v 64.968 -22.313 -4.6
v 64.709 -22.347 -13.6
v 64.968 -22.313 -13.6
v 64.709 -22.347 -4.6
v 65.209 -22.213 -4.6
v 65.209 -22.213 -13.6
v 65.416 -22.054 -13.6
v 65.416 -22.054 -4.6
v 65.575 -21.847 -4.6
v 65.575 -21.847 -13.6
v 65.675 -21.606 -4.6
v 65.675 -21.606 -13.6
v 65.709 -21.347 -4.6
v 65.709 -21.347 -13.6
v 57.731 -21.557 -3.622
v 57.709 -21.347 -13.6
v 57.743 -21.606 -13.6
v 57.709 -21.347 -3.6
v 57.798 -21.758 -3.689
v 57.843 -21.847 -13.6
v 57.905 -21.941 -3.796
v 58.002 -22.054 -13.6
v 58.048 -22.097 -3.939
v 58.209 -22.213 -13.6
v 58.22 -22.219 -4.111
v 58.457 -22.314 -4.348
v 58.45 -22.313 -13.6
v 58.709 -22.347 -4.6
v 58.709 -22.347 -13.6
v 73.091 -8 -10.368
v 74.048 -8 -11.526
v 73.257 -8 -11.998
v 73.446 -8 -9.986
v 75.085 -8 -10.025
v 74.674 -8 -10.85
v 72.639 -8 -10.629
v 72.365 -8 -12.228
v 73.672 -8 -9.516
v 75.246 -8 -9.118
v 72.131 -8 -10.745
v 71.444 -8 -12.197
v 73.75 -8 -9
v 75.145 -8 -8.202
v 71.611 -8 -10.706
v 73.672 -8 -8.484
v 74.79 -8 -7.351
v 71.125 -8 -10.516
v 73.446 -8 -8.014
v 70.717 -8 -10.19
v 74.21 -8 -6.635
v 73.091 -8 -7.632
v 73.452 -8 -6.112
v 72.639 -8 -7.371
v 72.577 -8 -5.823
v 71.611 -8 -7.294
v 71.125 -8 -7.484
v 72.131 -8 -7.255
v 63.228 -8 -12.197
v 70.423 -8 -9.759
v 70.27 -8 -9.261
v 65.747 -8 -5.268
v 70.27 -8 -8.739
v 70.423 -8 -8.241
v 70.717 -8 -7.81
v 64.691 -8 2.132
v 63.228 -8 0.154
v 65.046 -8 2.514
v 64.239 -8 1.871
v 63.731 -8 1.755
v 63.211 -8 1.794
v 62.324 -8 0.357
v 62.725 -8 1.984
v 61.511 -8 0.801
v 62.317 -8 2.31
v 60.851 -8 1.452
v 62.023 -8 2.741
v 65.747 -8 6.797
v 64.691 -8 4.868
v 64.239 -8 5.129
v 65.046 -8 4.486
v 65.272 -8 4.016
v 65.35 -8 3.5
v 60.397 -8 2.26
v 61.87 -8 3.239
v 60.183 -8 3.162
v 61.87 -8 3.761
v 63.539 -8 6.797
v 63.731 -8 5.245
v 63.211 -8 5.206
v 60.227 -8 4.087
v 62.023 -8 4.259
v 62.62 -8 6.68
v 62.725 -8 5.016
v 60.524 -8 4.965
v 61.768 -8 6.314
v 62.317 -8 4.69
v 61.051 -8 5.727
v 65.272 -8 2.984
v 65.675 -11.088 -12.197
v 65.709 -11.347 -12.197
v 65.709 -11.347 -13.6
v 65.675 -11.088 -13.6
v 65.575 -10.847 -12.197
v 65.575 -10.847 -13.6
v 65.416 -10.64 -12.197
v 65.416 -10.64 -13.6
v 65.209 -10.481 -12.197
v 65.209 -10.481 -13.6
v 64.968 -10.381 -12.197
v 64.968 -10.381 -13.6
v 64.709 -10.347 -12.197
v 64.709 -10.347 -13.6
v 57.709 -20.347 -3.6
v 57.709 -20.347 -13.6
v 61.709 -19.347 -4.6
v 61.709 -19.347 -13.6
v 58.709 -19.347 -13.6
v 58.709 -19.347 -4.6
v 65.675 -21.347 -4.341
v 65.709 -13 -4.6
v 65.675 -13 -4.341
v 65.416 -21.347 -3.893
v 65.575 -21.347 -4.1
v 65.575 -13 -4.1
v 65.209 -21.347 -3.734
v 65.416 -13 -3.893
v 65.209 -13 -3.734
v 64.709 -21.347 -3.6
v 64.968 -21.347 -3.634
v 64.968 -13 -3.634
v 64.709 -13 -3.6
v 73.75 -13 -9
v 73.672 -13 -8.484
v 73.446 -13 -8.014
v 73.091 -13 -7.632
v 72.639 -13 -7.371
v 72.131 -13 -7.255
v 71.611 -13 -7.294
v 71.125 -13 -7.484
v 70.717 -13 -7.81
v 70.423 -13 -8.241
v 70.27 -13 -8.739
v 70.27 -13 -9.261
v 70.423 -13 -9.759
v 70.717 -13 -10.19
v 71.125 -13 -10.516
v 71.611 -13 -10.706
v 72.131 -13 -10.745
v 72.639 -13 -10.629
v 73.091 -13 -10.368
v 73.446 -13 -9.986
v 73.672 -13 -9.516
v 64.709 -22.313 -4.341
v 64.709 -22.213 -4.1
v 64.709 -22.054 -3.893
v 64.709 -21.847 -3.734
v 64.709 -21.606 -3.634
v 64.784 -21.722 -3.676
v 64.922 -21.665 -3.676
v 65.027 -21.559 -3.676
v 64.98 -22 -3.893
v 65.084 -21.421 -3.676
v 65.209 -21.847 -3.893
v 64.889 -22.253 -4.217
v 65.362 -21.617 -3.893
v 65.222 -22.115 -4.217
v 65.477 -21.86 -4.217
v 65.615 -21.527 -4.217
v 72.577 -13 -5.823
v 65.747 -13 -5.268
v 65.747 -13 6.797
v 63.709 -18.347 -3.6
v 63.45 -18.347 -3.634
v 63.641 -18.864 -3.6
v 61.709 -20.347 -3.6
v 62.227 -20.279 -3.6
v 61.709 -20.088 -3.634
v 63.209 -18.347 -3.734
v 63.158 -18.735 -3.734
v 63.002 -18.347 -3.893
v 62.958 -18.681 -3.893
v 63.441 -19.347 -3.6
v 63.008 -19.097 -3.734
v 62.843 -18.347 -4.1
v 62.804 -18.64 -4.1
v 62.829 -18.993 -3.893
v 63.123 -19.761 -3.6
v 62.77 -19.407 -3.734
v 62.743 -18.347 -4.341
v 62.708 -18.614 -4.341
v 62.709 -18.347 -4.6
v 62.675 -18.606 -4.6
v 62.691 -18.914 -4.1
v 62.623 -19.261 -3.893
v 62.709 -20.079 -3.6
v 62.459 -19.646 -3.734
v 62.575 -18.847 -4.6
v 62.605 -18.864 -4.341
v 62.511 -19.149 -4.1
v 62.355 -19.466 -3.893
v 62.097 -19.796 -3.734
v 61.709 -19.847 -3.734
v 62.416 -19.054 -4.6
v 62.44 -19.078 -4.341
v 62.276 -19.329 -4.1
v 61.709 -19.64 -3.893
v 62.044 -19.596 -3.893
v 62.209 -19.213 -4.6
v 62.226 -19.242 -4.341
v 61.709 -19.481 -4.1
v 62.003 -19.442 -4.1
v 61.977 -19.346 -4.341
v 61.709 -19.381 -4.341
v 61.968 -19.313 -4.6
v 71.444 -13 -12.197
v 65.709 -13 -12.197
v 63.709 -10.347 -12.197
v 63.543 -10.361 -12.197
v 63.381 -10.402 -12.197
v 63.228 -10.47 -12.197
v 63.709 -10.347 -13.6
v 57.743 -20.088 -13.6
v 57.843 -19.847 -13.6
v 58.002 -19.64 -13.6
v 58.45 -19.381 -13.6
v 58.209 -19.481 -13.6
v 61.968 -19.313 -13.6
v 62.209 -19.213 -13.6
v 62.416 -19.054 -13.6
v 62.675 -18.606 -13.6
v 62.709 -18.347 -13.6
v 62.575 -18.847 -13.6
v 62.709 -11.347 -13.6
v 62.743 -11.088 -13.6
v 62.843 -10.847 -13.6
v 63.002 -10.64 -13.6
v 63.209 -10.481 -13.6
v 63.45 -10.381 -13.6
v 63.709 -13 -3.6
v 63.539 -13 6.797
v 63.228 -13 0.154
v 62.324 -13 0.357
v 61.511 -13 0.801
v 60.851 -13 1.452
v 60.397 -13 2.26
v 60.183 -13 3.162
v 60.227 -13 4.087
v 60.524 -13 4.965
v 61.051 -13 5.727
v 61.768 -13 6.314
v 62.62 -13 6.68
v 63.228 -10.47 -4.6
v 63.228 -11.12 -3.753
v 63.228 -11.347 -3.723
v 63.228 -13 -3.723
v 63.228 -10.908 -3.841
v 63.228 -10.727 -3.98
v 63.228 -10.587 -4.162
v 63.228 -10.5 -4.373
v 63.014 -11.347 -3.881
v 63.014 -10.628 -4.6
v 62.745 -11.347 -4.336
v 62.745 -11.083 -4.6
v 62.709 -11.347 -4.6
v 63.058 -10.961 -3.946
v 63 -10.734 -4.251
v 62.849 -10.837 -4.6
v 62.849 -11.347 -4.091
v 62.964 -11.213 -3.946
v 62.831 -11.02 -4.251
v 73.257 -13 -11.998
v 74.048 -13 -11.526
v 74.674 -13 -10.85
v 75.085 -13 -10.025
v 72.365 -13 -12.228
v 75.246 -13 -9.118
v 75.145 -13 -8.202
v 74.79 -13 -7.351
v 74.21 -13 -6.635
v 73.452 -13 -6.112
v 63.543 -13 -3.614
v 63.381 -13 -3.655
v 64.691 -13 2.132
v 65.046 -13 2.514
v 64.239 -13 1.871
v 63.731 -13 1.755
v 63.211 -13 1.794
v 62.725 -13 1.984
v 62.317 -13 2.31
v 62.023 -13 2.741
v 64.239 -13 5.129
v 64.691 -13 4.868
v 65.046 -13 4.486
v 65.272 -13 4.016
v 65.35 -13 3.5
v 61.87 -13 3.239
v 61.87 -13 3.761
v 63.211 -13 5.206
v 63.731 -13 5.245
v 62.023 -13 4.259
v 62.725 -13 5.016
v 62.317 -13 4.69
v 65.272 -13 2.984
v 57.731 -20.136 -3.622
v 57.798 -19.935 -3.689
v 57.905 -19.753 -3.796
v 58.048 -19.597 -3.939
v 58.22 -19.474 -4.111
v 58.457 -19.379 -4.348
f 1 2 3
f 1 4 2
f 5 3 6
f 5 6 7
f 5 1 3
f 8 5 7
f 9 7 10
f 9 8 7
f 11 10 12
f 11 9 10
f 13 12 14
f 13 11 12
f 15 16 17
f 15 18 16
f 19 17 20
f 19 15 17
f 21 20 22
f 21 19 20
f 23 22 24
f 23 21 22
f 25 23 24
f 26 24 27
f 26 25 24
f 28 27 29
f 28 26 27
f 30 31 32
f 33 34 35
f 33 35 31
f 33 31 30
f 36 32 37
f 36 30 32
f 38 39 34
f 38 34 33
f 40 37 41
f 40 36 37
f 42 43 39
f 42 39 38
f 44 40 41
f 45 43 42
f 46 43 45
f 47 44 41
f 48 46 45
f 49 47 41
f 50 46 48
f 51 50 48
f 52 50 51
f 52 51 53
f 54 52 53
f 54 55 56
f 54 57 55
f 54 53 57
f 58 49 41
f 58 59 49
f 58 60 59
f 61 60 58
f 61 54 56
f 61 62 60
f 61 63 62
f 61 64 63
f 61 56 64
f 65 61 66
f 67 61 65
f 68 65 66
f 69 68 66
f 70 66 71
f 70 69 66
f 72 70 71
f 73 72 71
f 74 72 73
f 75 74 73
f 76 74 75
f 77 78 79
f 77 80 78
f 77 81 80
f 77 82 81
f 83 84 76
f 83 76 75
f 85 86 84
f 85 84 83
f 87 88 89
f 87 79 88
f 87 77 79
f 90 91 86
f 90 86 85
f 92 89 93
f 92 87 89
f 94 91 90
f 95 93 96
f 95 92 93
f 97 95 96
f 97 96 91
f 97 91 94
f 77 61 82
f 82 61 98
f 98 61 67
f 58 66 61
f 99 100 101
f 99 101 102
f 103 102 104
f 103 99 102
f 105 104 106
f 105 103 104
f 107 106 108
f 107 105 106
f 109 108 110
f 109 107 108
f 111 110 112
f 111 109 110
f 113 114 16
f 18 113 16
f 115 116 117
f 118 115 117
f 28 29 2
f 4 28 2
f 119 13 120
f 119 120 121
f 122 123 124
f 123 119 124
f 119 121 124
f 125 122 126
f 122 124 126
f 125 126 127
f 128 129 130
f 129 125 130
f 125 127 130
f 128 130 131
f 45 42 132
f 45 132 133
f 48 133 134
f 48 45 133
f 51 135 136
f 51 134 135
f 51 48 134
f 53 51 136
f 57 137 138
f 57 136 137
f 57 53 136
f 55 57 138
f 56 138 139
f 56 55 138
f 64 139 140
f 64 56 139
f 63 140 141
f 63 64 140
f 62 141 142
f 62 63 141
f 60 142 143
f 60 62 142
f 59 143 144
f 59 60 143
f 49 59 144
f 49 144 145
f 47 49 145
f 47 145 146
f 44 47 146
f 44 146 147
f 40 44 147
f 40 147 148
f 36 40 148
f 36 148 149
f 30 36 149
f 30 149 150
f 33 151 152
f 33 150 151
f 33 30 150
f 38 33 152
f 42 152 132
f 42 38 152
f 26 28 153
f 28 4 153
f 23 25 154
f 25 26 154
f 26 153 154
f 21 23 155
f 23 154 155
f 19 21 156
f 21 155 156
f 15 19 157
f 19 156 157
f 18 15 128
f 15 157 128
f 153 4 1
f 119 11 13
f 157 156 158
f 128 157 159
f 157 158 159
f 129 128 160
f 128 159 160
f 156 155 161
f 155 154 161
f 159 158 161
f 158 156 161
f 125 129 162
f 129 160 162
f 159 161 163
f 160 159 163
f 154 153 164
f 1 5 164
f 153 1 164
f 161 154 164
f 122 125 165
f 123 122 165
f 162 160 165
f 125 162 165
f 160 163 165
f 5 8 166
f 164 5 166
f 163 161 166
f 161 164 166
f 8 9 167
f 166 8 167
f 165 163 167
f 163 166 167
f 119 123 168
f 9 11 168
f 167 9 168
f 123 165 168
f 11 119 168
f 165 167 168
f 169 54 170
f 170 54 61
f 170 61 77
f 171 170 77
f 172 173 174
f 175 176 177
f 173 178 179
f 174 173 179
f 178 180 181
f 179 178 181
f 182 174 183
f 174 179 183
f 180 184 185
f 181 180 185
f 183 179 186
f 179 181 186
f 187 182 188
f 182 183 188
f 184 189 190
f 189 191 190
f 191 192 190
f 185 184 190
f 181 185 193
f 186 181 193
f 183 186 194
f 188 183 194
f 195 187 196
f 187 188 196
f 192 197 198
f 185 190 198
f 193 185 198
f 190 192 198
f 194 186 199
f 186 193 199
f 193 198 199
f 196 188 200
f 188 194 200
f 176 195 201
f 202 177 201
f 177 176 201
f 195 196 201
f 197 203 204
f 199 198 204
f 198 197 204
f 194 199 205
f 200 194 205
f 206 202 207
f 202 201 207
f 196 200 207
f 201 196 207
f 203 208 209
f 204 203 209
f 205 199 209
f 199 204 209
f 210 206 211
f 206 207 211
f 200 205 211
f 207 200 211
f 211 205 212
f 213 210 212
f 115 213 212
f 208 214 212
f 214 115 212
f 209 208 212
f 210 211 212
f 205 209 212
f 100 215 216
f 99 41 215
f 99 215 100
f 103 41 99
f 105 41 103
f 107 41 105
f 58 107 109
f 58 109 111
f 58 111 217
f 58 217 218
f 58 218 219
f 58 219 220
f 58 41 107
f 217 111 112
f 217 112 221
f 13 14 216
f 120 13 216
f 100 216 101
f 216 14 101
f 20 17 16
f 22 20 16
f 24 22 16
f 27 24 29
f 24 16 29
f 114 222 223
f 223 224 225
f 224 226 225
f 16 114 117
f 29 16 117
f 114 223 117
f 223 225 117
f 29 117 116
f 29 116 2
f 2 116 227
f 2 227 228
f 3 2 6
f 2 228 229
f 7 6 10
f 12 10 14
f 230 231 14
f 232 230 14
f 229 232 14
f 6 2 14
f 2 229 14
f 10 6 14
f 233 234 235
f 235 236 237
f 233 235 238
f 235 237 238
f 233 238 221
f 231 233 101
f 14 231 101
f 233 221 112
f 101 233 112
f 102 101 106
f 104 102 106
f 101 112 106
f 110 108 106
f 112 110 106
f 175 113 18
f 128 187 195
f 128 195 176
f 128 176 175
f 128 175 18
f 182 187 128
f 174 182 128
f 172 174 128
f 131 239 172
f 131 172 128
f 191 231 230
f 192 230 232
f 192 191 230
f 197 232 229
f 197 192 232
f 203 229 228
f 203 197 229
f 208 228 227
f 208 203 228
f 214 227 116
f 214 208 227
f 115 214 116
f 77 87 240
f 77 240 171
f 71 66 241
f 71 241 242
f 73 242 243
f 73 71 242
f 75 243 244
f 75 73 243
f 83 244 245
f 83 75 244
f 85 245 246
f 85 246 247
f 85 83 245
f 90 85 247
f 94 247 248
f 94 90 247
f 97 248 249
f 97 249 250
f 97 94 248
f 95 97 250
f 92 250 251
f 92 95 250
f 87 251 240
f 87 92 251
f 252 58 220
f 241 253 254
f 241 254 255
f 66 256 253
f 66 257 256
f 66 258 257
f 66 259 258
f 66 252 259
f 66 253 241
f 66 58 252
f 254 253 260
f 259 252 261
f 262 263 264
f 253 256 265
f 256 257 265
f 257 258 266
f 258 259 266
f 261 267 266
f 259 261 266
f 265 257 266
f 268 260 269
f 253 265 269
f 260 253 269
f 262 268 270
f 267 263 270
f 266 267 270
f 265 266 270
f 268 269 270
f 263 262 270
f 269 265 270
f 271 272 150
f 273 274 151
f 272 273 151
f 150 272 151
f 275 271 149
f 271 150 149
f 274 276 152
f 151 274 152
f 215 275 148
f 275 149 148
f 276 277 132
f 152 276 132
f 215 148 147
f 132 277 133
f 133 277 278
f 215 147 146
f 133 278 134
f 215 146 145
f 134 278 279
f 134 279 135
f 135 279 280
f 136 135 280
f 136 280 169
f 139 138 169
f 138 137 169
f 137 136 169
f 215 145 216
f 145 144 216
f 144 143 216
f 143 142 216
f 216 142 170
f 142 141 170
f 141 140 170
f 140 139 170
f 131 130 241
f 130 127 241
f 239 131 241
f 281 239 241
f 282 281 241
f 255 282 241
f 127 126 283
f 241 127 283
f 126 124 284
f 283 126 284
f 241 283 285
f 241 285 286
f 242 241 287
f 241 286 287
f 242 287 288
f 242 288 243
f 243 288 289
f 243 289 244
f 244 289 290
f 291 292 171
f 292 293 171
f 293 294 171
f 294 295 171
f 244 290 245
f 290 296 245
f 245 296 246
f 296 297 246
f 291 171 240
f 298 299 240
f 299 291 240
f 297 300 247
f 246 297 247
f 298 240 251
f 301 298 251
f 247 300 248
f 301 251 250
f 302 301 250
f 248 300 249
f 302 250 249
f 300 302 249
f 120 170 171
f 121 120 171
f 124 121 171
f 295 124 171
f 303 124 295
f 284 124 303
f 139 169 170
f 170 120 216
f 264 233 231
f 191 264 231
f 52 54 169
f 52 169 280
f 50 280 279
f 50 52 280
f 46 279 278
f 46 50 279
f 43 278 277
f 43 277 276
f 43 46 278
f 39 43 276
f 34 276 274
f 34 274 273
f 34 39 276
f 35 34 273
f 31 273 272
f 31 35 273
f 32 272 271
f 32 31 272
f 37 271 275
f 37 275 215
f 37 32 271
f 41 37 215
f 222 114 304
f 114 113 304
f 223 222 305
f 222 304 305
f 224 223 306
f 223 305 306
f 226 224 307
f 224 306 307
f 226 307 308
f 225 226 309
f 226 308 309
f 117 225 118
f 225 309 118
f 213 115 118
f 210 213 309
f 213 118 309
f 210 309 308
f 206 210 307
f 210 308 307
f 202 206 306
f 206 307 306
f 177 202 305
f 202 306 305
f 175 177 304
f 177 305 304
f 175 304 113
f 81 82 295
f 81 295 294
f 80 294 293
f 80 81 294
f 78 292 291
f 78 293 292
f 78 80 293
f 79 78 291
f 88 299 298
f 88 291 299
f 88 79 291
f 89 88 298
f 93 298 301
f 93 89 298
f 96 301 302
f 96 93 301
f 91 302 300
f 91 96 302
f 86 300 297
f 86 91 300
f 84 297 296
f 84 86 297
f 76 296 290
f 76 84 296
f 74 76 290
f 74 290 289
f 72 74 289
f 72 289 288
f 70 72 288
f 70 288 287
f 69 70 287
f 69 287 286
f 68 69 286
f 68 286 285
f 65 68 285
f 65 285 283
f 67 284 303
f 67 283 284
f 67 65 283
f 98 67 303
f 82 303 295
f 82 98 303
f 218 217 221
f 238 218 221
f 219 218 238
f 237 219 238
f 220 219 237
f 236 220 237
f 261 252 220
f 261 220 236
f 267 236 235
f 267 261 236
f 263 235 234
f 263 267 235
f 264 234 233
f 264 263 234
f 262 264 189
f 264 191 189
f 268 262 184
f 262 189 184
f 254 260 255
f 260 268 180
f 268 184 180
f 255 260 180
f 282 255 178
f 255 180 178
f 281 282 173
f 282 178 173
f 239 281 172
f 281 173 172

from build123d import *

# Parameters (mm, degrees)
CYLINDER053_R                     = 1.75
CYLINDER053_DEPTH                 = 15
CYLINDER052_R                     = 1.75
CYLINDER052_DEPTH                 = 15
EXTRUDE003_DEPTH                  = 10
FILLET021_R                       = 1
EXTRUDE004_DEPTH                  = 5
PART_MIRRORING006_PLACEMENT_ANGLE = 180


with BuildPart() as m3holds021:
    # Cylinder053 → Cylinder053 (new body)
    with BuildSketch(Plane(origin=(72, 0.25, -9), x_dir=(1, 0, 0), z_dir=(0, -1, 0))):
        Circle(CYLINDER053_R)
    extrude(amount=CYLINDER053_DEPTH)


with BuildPart() as fusion064:
    # Cylinder052 → Cylinder052 (new body)
    with BuildSketch(Plane(origin=(63.6, 0.25, 3.5), x_dir=(1, 0, 0), z_dir=(0, -1, 0))):
        Circle(CYLINDER052_R)
    extrude(amount=CYLINDER052_DEPTH)

    # Fusion064: union m3Holds021
    add(m3holds021.part)


with BuildPart() as fillet021:
    # Sketch005 → Extrude003 (new body)
    with BuildSketch(Plane.XY):
        Polygon((57.709053, -19.346786), (57.709053, -22.346786), (65.709053, -22.346786), (65.709053, -10.346786), (62.709053, -10.346786), (62.709053, -19.346786), align=None)
    extrude(amount=EXTRUDE003_DEPTH)


with BuildPart() as fillet021_1:
    # Extrude003 placement: moved
    add(fillet021.part.moved(Location((0, 0, -14))))

    # Fillet021
    fillet021_edges = [fillet021_1.edges().sort_by_distance(p)[0] for p in [
        (57.709053, -19.346786, -9),
        (57.709053, -22.346786, -9),
        (65.709053, -22.346786, -9),
        (61.709053, -22.346786, -4),
        (65.709053, -10.346786, -9),
        (65.709053, -16.346786, -4),
        (62.709053, -10.346786, -9),
        (64.209053, -10.346786, -4),
        (62.709053, -19.346786, -9),
        (62.709053, -14.846786, -4),
        (60.209053, -19.346786, -4),
    ]]
    fillet(fillet021_edges, radius=FILLET021_R)


with BuildPart() as fillet021_2:
    # Fillet021 placement: moved
    add(fillet021_1.part.moved(Location((0, 0, 0.4))))


with BuildPart() as extrude004:
    # Sketch006 → Extrude004 (new body)
    with BuildSketch(Plane.XZ):
        with BuildLine():
            ThreePointArc((14.771842, 0.154152), (17.827348, 3.62591), (14.461083, 6.797264))
            Line((14.461083, 6.797264), (12.252875, 6.797264))
            Line((12.252875, -5.267611), (12.252875, 6.797264))
            Line((5.422805, -5.82309), (12.252875, -5.267611))
            ThreePointArc((5.422805, -5.82309), (2.802341, -9.576998), (6.556249, -12.197462))
            Line((6.556249, -12.197462), (14.771842, -12.197462))
            Line((14.771842, -12.197462), (14.771842, 0.154152))
        make_face()
    extrude(amount=EXTRUDE004_DEPTH)


with BuildPart() as extrude004_1:
    # Extrude004 placement: moved
    add(extrude004.part.moved(Location((0, -8, 0))))


with BuildPart() as c4holdbotttomright:
    # Part__Mirroring006: instance of Extrude004
    add(extrude004_1.part.mirror(Plane(origin=(0, 0, 0), x_dir=(0, 1, 0), z_dir=(0, 0, 1))))


with BuildPart() as c4holdbotttomright_1:
    # Part__Mirroring006 placement: moved
    add(c4holdbotttomright.part.moved(Location((78, 0, 0))).rotate(Axis((78, 0, 0), (0, 1, 0)), PART_MIRRORING006_PLACEMENT_ANGLE))

    # Fusion041: union Fillet021
    add(fillet021_2.part)

    # Cut014: cut Fusion064
    add(fusion064.part, mode=Mode.SUBTRACT)


solid = c4holdbotttomright_1.part
